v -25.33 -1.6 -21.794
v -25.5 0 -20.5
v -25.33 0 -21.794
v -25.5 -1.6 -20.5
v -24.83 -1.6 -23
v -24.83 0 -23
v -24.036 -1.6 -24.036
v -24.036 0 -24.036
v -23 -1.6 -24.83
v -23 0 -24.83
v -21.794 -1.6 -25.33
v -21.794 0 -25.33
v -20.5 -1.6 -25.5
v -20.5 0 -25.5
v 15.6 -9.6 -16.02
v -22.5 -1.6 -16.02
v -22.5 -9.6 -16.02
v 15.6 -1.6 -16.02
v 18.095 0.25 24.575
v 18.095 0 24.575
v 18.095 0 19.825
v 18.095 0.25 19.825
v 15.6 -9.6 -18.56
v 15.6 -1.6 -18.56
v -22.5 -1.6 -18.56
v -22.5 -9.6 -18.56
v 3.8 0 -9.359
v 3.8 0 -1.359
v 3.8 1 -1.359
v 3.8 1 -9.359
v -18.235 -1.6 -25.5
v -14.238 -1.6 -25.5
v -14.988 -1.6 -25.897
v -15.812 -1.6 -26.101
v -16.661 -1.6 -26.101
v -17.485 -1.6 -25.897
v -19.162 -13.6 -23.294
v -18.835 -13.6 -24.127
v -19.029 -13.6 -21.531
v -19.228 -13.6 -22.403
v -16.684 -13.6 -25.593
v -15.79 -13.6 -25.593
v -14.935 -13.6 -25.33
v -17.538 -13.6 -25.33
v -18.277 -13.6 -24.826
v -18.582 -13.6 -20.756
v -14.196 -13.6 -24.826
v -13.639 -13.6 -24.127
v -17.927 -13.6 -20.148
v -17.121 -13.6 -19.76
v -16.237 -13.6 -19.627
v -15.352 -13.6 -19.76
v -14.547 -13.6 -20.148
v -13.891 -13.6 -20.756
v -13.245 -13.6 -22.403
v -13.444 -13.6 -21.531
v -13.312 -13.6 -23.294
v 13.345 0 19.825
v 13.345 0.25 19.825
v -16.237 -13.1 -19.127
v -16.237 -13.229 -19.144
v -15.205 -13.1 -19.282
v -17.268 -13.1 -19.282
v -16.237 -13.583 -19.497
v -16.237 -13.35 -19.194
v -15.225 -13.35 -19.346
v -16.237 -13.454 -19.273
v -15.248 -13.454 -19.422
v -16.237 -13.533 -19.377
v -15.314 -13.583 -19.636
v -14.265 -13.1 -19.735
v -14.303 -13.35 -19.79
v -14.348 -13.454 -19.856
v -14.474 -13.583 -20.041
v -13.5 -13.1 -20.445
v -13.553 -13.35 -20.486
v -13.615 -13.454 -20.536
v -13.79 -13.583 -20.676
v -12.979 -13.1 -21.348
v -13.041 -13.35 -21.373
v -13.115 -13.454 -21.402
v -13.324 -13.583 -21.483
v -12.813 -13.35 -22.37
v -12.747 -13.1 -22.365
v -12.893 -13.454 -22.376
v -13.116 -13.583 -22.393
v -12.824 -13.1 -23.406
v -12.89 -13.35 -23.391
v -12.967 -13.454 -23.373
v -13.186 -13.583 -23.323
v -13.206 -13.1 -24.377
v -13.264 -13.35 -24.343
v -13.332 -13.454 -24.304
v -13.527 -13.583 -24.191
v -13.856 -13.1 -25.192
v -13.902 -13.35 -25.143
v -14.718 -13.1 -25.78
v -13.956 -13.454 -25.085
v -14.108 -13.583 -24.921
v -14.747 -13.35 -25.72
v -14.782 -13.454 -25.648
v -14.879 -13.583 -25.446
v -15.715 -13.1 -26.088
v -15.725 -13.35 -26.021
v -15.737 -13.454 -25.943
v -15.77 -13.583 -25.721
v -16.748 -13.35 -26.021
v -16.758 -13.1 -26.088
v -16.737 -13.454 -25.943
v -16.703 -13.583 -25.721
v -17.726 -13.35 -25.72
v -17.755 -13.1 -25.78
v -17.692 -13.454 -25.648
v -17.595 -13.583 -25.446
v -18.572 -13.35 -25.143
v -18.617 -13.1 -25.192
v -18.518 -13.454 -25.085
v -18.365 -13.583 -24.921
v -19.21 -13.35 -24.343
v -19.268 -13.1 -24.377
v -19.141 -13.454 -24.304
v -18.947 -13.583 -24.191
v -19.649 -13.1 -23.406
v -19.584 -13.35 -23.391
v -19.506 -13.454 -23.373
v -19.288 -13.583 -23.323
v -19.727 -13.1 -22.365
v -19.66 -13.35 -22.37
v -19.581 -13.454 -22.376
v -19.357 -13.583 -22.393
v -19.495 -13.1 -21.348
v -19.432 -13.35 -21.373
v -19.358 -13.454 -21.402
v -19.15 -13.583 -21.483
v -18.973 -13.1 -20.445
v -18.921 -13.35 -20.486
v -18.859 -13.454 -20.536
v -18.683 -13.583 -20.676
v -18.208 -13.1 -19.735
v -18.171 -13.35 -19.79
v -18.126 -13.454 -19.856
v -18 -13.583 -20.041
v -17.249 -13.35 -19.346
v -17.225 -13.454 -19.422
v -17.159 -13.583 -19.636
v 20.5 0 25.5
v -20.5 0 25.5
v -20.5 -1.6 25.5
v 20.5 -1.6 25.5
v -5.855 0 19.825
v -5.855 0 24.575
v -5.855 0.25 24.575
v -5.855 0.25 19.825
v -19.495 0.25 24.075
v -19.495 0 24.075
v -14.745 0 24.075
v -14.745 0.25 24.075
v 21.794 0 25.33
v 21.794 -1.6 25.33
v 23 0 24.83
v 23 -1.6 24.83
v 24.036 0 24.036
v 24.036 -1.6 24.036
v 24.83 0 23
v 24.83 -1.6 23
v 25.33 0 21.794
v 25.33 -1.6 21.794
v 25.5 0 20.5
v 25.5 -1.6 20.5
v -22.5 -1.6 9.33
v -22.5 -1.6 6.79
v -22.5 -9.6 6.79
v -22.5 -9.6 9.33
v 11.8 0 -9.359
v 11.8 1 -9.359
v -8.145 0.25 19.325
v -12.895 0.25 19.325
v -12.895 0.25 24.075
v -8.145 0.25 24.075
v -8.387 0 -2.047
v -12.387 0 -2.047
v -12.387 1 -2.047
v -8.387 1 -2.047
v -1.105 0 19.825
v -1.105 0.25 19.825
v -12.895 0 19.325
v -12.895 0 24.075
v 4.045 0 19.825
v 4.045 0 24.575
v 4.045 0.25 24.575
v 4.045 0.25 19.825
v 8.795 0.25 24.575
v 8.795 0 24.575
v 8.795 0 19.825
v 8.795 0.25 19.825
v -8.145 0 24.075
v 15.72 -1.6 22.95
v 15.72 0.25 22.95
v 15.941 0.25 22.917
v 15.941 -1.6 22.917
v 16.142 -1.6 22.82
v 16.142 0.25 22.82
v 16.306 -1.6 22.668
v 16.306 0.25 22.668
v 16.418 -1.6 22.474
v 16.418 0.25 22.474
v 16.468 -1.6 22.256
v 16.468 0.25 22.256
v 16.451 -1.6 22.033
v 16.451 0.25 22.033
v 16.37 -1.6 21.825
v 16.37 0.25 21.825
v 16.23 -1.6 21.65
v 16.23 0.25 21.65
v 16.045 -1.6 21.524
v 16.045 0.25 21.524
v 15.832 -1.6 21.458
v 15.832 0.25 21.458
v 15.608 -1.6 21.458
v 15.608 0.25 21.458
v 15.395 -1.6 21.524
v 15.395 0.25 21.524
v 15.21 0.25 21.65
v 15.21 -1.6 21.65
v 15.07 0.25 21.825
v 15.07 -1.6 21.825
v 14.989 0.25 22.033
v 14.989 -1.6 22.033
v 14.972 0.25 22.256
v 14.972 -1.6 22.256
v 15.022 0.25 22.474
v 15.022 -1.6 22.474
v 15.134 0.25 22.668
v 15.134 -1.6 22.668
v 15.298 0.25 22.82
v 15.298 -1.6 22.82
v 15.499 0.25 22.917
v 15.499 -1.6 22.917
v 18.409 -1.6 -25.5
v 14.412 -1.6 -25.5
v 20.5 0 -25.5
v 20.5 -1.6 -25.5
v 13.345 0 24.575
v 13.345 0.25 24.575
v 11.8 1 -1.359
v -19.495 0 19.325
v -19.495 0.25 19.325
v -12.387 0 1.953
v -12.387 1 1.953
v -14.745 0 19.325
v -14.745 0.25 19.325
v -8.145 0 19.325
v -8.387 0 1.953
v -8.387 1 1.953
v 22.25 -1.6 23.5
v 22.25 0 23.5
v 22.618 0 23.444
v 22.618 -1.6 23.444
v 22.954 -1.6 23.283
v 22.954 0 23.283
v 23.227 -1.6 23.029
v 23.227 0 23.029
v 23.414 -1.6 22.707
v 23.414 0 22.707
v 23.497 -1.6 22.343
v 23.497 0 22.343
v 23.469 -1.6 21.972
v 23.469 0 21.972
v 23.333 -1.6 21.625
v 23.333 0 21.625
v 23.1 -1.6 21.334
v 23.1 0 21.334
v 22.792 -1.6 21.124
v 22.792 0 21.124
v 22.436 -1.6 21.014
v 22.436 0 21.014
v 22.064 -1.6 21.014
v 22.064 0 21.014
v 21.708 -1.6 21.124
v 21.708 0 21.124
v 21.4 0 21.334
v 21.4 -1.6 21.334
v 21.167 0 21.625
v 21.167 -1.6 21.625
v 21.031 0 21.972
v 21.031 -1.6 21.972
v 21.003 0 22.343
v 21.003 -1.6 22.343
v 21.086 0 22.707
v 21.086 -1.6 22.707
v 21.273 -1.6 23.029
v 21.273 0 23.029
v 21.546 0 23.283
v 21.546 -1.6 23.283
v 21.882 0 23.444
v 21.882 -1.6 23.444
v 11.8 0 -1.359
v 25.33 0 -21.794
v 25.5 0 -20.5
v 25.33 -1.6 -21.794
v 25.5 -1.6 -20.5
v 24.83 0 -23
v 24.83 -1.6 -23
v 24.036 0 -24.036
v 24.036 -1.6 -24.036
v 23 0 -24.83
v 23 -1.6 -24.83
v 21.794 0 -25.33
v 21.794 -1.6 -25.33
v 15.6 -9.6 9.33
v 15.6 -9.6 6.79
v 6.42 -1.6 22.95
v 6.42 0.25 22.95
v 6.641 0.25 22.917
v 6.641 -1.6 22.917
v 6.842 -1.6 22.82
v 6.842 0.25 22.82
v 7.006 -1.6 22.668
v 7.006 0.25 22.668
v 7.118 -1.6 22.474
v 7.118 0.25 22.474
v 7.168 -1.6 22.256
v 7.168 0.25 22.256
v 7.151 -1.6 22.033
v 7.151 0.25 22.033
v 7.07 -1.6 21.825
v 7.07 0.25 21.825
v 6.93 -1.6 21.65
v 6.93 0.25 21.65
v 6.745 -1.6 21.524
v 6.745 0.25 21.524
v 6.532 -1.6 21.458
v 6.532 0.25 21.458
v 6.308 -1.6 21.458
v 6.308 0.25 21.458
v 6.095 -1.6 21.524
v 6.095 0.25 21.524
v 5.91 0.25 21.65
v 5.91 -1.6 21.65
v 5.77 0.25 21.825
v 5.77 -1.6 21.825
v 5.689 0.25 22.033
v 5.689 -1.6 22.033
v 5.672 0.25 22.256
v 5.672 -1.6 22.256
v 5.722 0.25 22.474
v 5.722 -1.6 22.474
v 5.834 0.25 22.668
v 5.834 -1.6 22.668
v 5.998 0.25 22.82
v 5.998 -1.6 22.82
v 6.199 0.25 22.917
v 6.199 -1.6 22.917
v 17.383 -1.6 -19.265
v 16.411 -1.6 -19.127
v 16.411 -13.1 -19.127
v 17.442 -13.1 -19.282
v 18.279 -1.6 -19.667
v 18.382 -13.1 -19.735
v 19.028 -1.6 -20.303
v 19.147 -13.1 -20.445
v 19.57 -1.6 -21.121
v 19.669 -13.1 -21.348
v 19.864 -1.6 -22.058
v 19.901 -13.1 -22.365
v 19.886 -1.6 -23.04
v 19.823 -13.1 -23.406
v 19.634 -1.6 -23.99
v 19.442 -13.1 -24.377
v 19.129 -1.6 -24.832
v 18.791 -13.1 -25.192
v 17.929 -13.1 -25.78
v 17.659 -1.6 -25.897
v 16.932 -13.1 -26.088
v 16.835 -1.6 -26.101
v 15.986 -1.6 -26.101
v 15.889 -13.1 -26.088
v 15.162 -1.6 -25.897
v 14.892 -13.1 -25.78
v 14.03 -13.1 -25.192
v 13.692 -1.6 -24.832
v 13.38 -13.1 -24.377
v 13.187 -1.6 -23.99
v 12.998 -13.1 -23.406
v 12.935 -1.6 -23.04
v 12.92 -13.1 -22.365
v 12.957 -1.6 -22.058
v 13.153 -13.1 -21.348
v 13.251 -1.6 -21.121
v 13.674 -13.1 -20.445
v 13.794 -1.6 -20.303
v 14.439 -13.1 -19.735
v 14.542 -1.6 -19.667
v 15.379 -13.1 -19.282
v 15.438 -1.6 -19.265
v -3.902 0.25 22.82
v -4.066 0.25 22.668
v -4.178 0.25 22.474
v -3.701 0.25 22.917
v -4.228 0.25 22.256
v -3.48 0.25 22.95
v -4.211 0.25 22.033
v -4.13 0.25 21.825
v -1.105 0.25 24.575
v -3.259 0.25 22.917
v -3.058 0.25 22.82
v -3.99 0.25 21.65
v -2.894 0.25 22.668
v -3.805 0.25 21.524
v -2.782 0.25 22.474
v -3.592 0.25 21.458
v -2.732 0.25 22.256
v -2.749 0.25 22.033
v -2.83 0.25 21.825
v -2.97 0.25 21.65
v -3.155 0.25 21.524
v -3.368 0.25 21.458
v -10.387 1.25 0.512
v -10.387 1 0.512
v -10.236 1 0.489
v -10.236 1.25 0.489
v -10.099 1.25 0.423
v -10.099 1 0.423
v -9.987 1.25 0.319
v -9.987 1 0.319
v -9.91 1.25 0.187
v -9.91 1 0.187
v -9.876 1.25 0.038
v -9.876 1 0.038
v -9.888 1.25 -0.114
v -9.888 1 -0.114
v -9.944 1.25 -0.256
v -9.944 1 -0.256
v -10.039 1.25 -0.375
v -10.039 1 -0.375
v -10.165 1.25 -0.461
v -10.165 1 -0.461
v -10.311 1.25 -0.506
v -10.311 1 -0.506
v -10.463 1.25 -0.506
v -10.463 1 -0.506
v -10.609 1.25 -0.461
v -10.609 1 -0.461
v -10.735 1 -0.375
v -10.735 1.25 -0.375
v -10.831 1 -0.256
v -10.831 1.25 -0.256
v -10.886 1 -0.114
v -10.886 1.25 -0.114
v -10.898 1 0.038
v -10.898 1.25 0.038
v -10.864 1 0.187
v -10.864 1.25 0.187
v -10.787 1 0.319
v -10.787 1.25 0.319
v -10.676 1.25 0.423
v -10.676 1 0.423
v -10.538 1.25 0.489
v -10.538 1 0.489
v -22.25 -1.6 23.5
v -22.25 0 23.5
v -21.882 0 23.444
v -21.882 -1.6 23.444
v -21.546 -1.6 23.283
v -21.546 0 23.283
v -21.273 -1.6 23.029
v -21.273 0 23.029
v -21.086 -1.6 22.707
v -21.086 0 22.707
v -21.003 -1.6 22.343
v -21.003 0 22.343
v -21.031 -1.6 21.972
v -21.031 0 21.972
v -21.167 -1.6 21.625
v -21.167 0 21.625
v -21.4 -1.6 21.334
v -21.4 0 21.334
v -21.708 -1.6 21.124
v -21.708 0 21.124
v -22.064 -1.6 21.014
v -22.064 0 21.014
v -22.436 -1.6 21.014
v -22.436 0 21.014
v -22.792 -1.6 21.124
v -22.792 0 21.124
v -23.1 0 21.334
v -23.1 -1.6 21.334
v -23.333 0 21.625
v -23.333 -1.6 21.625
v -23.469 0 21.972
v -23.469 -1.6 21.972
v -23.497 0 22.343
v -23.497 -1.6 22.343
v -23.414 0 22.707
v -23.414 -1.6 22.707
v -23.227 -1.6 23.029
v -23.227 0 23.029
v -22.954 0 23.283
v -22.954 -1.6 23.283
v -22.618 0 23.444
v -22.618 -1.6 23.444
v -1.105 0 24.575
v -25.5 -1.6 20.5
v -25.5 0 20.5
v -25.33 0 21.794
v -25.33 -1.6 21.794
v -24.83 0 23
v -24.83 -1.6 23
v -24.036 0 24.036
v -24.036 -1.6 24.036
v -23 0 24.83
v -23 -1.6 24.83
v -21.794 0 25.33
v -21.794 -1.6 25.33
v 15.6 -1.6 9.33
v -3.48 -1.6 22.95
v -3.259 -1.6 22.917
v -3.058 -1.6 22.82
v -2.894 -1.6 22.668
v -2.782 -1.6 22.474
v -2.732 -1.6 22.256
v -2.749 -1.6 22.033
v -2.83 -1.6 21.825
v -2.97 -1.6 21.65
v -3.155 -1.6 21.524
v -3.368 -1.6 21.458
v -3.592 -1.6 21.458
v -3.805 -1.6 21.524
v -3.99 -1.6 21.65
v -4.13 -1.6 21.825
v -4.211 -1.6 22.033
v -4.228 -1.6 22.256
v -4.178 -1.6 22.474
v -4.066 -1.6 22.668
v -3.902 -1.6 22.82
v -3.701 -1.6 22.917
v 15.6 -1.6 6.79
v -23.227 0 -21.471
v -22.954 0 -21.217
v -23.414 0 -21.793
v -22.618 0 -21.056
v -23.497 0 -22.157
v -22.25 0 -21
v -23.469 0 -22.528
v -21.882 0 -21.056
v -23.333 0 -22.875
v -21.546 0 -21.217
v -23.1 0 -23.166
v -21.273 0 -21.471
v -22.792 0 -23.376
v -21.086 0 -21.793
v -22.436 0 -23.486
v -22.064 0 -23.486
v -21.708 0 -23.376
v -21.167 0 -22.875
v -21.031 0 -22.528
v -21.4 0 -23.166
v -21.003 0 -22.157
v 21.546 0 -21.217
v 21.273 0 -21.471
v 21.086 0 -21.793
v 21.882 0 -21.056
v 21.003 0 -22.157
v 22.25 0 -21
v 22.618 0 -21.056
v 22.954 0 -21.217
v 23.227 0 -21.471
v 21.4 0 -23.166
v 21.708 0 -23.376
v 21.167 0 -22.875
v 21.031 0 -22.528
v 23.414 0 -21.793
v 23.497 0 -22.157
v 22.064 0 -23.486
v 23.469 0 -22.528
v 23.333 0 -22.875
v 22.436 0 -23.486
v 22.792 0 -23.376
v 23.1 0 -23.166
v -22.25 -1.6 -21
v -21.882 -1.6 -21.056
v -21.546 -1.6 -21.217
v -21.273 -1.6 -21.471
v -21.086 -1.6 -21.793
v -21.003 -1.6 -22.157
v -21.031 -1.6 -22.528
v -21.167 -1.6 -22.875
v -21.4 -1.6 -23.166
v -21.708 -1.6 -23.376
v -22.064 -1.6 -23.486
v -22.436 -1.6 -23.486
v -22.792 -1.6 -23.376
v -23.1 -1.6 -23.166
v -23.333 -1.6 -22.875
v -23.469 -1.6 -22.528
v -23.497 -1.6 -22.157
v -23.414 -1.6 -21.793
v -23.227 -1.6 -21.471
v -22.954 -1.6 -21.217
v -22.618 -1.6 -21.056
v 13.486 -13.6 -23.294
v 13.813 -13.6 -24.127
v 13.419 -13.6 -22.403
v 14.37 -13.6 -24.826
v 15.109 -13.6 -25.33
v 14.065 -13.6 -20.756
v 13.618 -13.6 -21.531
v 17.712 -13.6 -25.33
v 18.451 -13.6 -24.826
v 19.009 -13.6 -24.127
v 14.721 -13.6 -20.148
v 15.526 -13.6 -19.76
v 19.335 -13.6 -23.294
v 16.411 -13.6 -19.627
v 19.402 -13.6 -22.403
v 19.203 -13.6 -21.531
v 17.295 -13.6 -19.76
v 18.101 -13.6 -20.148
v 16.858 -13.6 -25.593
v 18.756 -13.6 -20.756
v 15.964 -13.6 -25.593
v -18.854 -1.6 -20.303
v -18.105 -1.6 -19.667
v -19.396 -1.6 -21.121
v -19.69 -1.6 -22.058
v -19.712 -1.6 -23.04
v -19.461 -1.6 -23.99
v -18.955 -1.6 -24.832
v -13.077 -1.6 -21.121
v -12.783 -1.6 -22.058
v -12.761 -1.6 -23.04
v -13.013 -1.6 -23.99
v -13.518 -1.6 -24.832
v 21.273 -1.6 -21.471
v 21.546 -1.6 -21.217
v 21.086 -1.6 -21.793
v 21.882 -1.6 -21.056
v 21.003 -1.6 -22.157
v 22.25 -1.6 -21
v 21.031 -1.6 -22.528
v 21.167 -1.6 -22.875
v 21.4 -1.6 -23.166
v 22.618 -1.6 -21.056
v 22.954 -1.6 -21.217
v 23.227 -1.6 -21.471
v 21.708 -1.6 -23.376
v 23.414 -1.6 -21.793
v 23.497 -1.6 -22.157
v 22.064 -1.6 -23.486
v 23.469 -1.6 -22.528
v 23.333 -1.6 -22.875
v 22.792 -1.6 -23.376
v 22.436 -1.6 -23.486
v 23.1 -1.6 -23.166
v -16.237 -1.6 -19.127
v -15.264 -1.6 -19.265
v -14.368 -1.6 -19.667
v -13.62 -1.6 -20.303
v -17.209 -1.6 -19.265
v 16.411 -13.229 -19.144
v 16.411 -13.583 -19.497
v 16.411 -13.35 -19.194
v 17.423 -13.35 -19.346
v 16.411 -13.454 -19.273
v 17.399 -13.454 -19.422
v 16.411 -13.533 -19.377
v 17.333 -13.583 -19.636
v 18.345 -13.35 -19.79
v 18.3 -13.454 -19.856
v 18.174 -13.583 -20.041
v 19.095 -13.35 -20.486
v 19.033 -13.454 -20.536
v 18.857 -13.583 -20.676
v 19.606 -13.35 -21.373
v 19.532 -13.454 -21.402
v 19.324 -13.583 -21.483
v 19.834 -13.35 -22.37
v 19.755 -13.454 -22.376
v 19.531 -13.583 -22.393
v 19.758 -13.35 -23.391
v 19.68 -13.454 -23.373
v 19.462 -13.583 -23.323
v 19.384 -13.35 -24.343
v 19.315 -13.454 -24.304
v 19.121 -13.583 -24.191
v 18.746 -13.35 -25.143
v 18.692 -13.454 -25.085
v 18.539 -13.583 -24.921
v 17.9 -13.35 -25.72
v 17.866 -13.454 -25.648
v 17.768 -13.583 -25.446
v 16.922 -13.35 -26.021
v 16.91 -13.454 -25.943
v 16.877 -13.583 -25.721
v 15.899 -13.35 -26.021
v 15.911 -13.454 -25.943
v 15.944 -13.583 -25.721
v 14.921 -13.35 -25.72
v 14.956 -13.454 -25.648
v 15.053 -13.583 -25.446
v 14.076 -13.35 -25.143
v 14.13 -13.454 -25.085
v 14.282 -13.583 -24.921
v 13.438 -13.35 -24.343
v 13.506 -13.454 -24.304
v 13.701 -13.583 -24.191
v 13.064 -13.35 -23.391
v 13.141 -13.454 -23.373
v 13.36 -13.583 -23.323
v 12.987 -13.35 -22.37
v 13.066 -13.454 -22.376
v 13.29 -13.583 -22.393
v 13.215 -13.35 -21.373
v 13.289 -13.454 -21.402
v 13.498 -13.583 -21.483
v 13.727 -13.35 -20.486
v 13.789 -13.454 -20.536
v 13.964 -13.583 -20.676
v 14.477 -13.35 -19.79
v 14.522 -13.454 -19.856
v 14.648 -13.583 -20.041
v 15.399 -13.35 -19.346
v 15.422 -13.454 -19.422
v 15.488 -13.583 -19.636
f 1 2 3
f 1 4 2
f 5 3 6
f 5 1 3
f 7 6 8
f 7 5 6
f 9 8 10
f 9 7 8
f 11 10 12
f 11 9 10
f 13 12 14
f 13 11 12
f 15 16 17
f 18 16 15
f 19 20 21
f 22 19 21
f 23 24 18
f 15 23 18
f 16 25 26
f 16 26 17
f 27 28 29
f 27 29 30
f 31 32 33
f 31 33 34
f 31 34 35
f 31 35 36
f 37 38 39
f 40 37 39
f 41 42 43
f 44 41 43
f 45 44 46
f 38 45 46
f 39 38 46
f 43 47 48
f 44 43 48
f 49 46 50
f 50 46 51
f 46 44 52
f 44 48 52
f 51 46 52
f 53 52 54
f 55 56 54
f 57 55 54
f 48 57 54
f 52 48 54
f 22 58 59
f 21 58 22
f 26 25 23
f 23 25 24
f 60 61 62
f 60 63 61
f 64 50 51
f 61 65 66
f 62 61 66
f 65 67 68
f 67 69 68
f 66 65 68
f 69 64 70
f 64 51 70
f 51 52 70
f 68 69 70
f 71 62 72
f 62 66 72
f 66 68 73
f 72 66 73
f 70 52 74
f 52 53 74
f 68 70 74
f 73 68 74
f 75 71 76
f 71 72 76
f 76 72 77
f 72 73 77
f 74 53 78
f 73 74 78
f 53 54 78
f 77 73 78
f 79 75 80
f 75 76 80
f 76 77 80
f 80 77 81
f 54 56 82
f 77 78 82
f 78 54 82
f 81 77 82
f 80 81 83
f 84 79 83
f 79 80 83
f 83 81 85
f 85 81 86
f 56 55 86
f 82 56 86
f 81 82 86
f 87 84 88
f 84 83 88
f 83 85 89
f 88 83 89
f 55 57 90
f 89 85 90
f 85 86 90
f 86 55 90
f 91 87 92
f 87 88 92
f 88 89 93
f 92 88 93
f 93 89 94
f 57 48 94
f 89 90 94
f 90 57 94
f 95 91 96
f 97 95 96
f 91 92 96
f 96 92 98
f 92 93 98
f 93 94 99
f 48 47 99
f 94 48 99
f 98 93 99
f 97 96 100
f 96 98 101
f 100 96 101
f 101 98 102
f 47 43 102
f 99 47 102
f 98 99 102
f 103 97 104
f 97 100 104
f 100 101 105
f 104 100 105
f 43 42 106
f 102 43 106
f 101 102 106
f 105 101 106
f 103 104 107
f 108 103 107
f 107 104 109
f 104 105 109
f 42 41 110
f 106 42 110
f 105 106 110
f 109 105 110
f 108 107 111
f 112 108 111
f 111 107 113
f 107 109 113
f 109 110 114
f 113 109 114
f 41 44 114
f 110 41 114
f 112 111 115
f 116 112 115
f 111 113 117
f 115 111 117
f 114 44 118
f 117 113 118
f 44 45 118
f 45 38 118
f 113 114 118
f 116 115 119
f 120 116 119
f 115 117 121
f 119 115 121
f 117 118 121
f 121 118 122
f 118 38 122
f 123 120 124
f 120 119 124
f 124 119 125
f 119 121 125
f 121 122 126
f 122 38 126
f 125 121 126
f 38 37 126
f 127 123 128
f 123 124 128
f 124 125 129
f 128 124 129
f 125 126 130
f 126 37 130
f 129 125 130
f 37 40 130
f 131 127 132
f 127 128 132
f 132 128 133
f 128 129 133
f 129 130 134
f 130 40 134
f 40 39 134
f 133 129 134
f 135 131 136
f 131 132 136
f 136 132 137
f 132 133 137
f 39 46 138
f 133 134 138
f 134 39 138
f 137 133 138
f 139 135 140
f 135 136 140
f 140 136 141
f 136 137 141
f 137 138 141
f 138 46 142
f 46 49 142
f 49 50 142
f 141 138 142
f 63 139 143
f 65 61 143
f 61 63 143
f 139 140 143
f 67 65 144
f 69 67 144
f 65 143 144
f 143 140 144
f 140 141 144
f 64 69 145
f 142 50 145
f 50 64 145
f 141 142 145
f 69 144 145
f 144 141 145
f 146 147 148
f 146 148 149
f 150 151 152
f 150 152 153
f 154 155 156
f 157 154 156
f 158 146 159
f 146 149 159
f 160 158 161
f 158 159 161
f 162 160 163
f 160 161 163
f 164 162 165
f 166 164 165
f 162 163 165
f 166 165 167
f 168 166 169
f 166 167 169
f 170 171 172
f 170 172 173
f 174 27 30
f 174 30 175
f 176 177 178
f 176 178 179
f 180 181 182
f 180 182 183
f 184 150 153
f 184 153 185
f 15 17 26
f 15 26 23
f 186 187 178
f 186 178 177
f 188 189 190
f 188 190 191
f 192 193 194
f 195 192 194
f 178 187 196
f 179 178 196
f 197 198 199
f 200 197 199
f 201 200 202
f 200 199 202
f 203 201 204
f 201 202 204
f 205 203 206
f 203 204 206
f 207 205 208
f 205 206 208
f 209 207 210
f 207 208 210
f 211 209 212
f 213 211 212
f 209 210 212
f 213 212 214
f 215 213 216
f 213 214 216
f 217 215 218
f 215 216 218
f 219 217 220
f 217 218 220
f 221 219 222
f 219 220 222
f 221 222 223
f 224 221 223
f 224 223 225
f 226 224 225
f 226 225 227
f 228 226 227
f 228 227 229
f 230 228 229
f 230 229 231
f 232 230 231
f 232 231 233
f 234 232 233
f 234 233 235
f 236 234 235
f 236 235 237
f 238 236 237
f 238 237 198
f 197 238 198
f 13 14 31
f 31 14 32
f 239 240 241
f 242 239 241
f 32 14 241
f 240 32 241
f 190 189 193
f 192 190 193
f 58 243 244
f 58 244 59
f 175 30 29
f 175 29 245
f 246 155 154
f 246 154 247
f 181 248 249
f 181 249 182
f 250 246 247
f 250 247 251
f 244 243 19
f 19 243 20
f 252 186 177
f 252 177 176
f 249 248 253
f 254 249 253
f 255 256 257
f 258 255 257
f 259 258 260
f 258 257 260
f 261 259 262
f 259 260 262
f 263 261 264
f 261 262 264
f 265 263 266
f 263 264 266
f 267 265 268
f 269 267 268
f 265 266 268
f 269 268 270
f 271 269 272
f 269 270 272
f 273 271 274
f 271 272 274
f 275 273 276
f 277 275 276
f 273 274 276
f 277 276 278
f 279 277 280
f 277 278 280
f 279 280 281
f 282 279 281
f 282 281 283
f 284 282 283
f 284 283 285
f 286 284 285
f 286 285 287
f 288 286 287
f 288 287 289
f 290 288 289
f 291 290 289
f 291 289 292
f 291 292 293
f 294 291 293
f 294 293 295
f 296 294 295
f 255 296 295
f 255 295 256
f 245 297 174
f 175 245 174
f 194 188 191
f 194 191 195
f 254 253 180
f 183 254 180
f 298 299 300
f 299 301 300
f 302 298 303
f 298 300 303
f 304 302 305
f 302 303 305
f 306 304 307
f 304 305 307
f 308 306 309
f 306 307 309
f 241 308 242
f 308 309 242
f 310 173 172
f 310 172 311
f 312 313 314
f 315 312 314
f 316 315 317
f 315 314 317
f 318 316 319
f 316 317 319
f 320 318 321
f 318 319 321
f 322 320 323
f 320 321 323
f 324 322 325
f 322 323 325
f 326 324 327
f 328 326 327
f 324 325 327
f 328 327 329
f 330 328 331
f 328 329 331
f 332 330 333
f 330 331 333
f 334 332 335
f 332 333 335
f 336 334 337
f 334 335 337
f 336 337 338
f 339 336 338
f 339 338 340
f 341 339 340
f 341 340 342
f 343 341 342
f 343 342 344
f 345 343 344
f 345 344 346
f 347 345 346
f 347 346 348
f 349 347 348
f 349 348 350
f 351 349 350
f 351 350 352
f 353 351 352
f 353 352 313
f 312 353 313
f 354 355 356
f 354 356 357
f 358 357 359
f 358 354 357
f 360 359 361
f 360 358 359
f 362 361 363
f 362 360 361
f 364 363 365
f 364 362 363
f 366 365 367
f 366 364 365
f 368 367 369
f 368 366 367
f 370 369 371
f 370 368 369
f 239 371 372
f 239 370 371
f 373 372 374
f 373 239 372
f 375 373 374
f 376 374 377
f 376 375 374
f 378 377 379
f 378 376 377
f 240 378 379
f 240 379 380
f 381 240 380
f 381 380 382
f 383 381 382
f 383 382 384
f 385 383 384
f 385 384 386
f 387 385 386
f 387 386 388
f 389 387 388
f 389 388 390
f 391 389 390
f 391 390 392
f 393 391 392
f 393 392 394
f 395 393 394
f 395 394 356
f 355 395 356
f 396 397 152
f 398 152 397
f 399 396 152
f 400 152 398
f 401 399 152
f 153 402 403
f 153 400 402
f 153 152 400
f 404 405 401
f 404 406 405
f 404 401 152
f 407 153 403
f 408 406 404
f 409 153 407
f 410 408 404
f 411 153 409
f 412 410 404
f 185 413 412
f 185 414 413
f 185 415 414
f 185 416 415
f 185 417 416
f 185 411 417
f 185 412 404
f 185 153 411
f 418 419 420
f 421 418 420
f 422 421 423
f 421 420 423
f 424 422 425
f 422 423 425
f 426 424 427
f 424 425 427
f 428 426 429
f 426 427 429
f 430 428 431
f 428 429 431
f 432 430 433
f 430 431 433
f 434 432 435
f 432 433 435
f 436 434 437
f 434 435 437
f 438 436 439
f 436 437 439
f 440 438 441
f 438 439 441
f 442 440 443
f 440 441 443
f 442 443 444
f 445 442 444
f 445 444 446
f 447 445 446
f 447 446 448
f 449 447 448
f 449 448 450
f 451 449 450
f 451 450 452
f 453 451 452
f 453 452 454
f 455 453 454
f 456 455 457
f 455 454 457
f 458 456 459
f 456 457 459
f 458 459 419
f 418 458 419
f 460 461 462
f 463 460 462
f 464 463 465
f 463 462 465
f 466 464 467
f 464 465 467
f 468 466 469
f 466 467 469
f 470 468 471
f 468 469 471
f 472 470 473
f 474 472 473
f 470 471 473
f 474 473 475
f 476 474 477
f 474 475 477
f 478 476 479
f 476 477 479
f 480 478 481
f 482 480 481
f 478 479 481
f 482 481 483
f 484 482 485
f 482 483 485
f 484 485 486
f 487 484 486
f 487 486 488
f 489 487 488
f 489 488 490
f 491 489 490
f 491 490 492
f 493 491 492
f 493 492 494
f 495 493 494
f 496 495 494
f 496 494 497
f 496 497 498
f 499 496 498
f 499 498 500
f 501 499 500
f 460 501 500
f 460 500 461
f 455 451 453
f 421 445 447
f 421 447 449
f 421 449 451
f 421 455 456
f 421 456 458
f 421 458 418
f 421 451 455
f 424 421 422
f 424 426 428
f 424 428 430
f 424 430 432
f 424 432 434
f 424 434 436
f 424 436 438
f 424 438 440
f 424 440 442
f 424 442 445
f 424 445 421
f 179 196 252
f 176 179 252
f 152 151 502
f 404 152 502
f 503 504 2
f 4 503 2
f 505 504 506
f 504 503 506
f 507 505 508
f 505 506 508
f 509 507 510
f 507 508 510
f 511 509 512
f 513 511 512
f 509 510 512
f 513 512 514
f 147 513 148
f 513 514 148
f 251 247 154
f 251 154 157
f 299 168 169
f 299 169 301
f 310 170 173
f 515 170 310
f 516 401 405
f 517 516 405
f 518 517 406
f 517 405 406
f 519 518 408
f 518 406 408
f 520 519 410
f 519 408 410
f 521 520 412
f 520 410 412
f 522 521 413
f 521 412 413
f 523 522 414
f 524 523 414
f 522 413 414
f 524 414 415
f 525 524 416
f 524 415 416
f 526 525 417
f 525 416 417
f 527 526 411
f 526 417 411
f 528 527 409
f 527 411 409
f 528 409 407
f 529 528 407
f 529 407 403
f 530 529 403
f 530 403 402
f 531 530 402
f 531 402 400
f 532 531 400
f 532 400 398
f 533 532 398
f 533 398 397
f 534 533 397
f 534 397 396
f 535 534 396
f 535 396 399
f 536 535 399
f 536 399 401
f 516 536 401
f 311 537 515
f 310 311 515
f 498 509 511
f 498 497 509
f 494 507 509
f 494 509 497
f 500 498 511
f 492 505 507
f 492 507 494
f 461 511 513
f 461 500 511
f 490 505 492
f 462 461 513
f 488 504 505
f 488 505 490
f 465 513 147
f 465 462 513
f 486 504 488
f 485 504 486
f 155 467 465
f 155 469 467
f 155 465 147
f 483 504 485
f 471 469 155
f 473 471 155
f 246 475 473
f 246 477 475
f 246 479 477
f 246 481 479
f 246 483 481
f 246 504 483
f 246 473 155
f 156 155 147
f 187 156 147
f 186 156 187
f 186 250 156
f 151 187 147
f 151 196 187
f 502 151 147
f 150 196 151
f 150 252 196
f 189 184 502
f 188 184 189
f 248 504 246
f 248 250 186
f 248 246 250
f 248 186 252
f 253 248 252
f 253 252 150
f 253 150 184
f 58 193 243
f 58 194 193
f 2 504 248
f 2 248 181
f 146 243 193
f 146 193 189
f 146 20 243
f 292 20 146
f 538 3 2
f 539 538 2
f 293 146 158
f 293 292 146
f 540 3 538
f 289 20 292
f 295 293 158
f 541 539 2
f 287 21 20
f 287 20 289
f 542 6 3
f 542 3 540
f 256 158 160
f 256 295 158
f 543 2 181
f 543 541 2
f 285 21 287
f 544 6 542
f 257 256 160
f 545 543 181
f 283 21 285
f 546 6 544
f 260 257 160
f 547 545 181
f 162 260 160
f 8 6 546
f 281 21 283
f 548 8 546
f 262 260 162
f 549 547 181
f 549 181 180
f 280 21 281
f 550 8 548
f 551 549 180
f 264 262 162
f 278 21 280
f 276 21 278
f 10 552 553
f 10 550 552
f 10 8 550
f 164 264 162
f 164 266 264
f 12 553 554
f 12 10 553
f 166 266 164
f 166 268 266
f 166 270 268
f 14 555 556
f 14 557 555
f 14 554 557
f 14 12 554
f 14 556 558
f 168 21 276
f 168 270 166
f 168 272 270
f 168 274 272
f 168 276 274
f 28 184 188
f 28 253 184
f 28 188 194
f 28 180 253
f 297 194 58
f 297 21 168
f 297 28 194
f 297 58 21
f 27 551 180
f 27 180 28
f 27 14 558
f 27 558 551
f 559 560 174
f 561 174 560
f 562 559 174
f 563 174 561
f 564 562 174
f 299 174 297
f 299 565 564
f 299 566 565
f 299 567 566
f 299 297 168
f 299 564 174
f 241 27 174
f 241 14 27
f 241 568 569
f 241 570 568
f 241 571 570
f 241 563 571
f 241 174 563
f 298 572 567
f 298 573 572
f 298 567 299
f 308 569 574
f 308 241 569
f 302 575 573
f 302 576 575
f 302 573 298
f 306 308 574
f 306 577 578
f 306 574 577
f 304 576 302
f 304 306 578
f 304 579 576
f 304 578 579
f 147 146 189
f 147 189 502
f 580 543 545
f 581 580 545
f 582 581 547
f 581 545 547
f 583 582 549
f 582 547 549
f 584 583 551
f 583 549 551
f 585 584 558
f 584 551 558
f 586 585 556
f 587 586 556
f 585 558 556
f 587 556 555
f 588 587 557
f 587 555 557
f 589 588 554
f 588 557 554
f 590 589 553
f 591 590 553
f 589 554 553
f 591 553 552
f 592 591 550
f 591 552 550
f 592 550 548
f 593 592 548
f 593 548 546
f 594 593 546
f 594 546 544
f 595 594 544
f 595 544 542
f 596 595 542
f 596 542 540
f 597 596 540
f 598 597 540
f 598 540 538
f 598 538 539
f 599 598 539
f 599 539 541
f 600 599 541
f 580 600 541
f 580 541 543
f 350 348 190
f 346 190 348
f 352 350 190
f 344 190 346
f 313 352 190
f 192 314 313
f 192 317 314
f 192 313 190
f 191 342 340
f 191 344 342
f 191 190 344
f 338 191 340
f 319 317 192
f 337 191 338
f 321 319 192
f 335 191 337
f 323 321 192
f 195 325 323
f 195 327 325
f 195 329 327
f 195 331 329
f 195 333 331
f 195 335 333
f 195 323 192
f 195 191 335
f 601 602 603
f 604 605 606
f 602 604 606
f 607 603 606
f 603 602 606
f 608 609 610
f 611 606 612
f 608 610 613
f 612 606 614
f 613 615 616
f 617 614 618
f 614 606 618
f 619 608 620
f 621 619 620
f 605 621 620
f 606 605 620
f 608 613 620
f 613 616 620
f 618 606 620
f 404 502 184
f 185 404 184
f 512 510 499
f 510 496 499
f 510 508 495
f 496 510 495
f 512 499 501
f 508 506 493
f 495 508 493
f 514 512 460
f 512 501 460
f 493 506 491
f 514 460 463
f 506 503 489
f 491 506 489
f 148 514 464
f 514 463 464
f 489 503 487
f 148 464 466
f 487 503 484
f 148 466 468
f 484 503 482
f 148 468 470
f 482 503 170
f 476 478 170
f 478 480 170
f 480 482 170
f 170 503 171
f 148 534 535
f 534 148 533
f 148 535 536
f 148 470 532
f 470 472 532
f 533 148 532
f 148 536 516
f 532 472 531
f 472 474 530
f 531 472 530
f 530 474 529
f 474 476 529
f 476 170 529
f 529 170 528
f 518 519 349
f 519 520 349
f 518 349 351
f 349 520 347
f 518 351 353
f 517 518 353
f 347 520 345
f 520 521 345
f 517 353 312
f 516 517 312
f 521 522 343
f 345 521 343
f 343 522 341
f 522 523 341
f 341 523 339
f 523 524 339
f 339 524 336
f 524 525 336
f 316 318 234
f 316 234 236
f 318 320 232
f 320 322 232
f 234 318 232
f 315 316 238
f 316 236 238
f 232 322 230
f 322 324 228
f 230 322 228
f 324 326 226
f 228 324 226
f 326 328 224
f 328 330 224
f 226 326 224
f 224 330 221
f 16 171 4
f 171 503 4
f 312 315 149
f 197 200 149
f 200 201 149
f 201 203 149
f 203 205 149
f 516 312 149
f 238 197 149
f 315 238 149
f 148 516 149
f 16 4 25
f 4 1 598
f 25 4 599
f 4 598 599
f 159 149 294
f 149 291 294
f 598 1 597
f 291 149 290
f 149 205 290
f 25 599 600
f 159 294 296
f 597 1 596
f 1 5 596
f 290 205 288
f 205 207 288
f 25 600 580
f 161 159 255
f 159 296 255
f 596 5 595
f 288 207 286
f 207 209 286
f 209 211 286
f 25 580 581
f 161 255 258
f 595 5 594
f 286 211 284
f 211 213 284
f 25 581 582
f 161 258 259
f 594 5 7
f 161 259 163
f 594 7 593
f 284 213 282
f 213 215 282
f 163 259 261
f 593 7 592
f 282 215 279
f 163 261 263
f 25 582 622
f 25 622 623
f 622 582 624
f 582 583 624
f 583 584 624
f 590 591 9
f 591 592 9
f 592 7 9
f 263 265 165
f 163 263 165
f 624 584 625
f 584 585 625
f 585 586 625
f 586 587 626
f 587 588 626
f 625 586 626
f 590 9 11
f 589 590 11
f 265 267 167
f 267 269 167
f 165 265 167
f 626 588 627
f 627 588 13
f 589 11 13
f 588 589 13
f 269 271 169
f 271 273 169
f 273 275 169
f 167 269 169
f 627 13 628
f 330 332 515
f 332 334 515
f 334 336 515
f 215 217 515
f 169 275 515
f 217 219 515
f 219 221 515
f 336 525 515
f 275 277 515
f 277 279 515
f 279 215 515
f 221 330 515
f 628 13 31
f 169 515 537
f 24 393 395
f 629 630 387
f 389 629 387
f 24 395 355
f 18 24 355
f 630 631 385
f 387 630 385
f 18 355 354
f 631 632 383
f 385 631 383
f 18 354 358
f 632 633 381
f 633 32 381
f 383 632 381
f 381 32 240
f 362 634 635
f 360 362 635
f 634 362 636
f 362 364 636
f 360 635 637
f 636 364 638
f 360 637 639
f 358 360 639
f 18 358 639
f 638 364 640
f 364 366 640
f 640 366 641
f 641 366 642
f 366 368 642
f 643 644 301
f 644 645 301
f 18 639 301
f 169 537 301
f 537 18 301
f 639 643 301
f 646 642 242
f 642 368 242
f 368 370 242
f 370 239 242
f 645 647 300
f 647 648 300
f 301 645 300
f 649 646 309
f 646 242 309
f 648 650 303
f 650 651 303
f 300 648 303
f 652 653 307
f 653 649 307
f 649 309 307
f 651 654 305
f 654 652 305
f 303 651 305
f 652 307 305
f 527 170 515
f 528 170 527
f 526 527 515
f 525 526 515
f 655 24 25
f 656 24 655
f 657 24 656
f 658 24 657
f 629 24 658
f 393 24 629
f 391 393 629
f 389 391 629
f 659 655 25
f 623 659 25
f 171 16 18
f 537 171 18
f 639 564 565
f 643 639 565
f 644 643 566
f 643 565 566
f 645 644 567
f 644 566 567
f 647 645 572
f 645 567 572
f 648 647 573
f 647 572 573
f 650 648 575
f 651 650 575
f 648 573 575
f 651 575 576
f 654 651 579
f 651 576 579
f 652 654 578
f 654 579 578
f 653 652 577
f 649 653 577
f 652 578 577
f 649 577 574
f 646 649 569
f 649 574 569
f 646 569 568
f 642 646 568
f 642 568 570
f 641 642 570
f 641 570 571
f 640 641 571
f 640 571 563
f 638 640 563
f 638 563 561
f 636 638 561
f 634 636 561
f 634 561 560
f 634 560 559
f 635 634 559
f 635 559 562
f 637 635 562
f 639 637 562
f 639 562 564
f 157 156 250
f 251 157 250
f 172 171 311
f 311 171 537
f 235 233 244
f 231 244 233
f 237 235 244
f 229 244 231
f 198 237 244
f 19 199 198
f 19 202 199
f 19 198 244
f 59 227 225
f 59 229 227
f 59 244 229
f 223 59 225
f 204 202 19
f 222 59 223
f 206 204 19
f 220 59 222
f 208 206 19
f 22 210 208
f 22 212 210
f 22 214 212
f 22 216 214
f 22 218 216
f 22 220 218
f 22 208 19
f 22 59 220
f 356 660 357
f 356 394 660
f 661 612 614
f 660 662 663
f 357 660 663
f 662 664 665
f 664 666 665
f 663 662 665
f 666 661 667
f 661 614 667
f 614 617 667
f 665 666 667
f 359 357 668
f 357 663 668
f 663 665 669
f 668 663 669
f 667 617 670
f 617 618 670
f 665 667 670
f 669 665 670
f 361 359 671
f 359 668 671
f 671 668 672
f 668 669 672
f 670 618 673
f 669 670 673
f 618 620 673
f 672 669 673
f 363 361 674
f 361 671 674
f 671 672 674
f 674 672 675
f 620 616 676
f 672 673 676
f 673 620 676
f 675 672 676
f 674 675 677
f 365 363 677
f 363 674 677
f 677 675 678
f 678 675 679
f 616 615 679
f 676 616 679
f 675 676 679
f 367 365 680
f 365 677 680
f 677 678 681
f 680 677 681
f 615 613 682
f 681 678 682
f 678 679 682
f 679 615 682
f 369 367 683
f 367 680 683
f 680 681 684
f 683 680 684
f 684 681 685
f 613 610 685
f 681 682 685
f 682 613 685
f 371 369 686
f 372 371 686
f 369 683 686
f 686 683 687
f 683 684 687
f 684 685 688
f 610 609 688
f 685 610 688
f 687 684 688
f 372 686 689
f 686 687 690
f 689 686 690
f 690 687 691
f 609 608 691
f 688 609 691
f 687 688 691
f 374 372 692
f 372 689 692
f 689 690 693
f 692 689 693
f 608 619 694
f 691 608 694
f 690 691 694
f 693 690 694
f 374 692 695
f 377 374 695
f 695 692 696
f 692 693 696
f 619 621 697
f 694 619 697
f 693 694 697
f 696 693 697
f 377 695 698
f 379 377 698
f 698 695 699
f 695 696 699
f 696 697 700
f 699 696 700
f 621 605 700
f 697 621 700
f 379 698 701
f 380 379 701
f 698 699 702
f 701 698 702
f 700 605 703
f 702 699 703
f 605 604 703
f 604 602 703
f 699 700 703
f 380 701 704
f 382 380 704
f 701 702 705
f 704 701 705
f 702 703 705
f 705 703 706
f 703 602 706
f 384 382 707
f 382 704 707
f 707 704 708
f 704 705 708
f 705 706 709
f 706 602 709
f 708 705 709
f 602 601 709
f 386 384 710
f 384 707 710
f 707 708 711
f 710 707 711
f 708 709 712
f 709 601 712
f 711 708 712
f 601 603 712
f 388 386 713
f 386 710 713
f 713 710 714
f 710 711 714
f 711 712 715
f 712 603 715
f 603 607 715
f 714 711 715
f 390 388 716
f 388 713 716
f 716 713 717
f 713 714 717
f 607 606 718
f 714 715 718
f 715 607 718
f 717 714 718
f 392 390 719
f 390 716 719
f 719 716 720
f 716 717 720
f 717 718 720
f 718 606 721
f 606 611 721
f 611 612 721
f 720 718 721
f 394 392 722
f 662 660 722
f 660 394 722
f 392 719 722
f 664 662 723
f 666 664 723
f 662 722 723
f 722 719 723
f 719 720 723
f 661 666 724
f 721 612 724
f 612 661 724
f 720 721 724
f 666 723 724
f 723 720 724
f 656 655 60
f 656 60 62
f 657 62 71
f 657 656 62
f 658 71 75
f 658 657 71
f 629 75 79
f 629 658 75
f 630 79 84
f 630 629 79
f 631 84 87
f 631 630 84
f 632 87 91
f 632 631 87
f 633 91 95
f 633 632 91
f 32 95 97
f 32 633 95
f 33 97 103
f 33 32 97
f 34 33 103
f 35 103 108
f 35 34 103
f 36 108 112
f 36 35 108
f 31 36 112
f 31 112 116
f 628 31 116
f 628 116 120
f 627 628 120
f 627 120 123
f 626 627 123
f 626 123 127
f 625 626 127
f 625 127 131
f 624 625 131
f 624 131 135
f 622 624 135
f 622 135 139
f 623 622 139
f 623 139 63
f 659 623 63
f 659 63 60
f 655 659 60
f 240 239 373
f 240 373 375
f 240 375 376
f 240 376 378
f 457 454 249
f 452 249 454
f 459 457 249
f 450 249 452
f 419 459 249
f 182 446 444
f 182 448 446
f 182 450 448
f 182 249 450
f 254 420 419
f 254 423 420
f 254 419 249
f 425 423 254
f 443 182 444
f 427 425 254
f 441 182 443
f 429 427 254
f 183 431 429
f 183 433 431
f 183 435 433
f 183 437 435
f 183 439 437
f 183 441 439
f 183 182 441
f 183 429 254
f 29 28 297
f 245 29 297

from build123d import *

# Parameters (mm, degrees)
CROQUIS1_W              = 51
CROQUIS1_H              = 51
SALIENTE_EXTRUIR1_DEPTH = 1.6
REDONDEO1_R             = 5
CROQUIS2_W              = 4
CROQUIS2_H              = 4
CROQUIS2_W_2            = 8
CROQUIS2_H_2            = 8
SALIENTE_EXTRUIR2_DEPTH = 1
CROQUIS3_R              = 1.25
CORTAR_EXTRUIR1_DEPTH   = 37.097922378
CROQUIS4_W              = 4.75
CROQUIS4_H              = 4.75
SALIENTE_EXTRUIR3_DEPTH = 0.25
CROQUIS5_R              = 0.75
CORTAR_EXTRUIR2_DEPTH   = 37.109867073
CROQUIS6_R              = 3.5
SALIENTE_EXTRUIR4_DEPTH = 12
REDONDEO2_R             = 0.5
CROQUIS7_W              = 38.1
CROQUIS7_H              = 2.54
SALIENTE_EXTRUIR5_DEPTH = 8
CROQUIS8_R              = 0.512123022
SALIENTE_EXTRUIR6_DEPTH = 0.25


with BuildPart() as part:
    # Croquis1 → Saliente-Extruir1 (new body)
    with BuildSketch(Plane(origin=(0, 0, 0), x_dir=(1, 0, 0), z_dir=(0, 1, 0))):
        Rectangle(CROQUIS1_W, CROQUIS1_H)
    extrude(amount=-SALIENTE_EXTRUIR1_DEPTH)

    # Redondeo1
    redondeo1_edges = [part.edges().sort_by_distance(p)[0] for p in [
        (25.5, -0.8, 25.5),
        (-25.5, -0.8, 25.5),
        (-25.5, -0.8, -25.5),
        (25.5, -0.8, -25.5),
    ]]
    fillet(redondeo1_edges, radius=REDONDEO1_R)

    # Croquis2 → Saliente-Extruir2 (add)
    with BuildSketch(Plane(origin=(0, 0, 0), x_dir=(1, 0, 0), z_dir=(0, 1, 0))):
        with Locations((-10.387074195, 0.047356258)):
            Rectangle(CROQUIS2_W, CROQUIS2_H)
        with Locations((7.8, 5.359014033)):
            Rectangle(CROQUIS2_W_2, CROQUIS2_H_2)
    extrude(amount=SALIENTE_EXTRUIR2_DEPTH)

    # Croquis3 → Cortar-Extruir1 (cut, through all)
    with BuildSketch(Plane(origin=(0, 0, 0), x_dir=(1, 0, 0), z_dir=(0, 1, 0))):
        with Locations(Location((-22.25, 22.25, 0), (0, 0, 270))):
            Circle(CROQUIS3_R)
        with Locations(Location((-22.25, -22.25, 0), (0, 0, 270))):
            Circle(CROQUIS3_R)
        with Locations(Location((22.25, -22.25, 0), (0, 0, 270))):
            Circle(CROQUIS3_R)
        with Locations(Location((22.25, 22.25, 0), (0, 0, 270))):
            Circle(CROQUIS3_R)
    extrude(amount=-CORTAR_EXTRUIR1_DEPTH, mode=Mode.SUBTRACT)

    # Croquis4 → Saliente-Extruir3 (add)
    with BuildSketch(Plane(origin=(0, 0, 0), x_dir=(1, 0, 0), z_dir=(0, 1, 0))):
        with Locations((-3.48, -22.2)):
            Rectangle(CROQUIS4_W, CROQUIS4_H)
        with Locations((6.42, -22.2)):
            Rectangle(CROQUIS4_W, CROQUIS4_H)
        with Locations((15.72, -22.2)):
            Rectangle(CROQUIS4_W, CROQUIS4_H)
        with Locations((-10.52, -21.7)):
            Rectangle(CROQUIS4_W, CROQUIS4_H)
        with Locations((-17.12, -21.7)):
            Rectangle(CROQUIS4_W, CROQUIS4_H)
    extrude(amount=SALIENTE_EXTRUIR3_DEPTH)

    # Croquis5 → Cortar-Extruir2 (cut, through all)
    with BuildSketch(Plane(origin=(0, 0.25, 0), x_dir=(1, 0, 0), z_dir=(0, 1, 0))):
        with Locations(Location((-3.48, -22.2, 0), (0, 0, 270))):
            Circle(CROQUIS5_R)
        with Locations(Location((6.42, -22.2, 0), (0, 0, 270))):
            Circle(CROQUIS5_R)
        with Locations(Location((15.72, -22.2, 0), (0, 0, 270))):
            Circle(CROQUIS5_R)
    extrude(amount=-CORTAR_EXTRUIR2_DEPTH, mode=Mode.SUBTRACT)

    # Croquis6 → Saliente-Extruir4 (add)
    with BuildSketch(Plane(origin=(0, -1.6, 0), x_dir=(1, 0, 0), z_dir=(0, 1, 0))):
        with Locations(Location((-16.236720917, 22.626792328, 0), (0, 0, 270))):
            Circle(CROQUIS6_R)
        with Locations(Location((16.410663599, 22.626792328, 0), (0, 0, 270))):
            Circle(CROQUIS6_R)
    extrude(amount=-SALIENTE_EXTRUIR4_DEPTH)

    # Redondeo2
    redondeo2_edges = [part.edges().sort_by_distance(p)[0] for p in [
        (-16.236720917, -13.6, -26.126792328),
        (16.410663599, -13.6, -26.126792328),
    ]]
    fillet(redondeo2_edges, radius=REDONDEO2_R)

    # Croquis7 → Saliente-Extruir5 (add)
    with BuildSketch(Plane.XZ.offset(1.6)):
        with Locations((-3.45, -17.29)):
            Rectangle(CROQUIS7_W, CROQUIS7_H)
        with Locations((-3.45, 8.06)):
            Rectangle(CROQUIS7_W, CROQUIS7_H)
    extrude(amount=SALIENTE_EXTRUIR5_DEPTH)

    # Croquis8 → Saliente-Extruir6 (add)
    with BuildSketch(Plane(origin=(0, 1, 0), x_dir=(1, 0, 0), z_dir=(0, 1, 0))):
        with Locations(Location((-10.387074195, 0, 0), (0, 0, 270))):
            Circle(CROQUIS8_R)
    extrude(amount=SALIENTE_EXTRUIR6_DEPTH)


solid = part.part
